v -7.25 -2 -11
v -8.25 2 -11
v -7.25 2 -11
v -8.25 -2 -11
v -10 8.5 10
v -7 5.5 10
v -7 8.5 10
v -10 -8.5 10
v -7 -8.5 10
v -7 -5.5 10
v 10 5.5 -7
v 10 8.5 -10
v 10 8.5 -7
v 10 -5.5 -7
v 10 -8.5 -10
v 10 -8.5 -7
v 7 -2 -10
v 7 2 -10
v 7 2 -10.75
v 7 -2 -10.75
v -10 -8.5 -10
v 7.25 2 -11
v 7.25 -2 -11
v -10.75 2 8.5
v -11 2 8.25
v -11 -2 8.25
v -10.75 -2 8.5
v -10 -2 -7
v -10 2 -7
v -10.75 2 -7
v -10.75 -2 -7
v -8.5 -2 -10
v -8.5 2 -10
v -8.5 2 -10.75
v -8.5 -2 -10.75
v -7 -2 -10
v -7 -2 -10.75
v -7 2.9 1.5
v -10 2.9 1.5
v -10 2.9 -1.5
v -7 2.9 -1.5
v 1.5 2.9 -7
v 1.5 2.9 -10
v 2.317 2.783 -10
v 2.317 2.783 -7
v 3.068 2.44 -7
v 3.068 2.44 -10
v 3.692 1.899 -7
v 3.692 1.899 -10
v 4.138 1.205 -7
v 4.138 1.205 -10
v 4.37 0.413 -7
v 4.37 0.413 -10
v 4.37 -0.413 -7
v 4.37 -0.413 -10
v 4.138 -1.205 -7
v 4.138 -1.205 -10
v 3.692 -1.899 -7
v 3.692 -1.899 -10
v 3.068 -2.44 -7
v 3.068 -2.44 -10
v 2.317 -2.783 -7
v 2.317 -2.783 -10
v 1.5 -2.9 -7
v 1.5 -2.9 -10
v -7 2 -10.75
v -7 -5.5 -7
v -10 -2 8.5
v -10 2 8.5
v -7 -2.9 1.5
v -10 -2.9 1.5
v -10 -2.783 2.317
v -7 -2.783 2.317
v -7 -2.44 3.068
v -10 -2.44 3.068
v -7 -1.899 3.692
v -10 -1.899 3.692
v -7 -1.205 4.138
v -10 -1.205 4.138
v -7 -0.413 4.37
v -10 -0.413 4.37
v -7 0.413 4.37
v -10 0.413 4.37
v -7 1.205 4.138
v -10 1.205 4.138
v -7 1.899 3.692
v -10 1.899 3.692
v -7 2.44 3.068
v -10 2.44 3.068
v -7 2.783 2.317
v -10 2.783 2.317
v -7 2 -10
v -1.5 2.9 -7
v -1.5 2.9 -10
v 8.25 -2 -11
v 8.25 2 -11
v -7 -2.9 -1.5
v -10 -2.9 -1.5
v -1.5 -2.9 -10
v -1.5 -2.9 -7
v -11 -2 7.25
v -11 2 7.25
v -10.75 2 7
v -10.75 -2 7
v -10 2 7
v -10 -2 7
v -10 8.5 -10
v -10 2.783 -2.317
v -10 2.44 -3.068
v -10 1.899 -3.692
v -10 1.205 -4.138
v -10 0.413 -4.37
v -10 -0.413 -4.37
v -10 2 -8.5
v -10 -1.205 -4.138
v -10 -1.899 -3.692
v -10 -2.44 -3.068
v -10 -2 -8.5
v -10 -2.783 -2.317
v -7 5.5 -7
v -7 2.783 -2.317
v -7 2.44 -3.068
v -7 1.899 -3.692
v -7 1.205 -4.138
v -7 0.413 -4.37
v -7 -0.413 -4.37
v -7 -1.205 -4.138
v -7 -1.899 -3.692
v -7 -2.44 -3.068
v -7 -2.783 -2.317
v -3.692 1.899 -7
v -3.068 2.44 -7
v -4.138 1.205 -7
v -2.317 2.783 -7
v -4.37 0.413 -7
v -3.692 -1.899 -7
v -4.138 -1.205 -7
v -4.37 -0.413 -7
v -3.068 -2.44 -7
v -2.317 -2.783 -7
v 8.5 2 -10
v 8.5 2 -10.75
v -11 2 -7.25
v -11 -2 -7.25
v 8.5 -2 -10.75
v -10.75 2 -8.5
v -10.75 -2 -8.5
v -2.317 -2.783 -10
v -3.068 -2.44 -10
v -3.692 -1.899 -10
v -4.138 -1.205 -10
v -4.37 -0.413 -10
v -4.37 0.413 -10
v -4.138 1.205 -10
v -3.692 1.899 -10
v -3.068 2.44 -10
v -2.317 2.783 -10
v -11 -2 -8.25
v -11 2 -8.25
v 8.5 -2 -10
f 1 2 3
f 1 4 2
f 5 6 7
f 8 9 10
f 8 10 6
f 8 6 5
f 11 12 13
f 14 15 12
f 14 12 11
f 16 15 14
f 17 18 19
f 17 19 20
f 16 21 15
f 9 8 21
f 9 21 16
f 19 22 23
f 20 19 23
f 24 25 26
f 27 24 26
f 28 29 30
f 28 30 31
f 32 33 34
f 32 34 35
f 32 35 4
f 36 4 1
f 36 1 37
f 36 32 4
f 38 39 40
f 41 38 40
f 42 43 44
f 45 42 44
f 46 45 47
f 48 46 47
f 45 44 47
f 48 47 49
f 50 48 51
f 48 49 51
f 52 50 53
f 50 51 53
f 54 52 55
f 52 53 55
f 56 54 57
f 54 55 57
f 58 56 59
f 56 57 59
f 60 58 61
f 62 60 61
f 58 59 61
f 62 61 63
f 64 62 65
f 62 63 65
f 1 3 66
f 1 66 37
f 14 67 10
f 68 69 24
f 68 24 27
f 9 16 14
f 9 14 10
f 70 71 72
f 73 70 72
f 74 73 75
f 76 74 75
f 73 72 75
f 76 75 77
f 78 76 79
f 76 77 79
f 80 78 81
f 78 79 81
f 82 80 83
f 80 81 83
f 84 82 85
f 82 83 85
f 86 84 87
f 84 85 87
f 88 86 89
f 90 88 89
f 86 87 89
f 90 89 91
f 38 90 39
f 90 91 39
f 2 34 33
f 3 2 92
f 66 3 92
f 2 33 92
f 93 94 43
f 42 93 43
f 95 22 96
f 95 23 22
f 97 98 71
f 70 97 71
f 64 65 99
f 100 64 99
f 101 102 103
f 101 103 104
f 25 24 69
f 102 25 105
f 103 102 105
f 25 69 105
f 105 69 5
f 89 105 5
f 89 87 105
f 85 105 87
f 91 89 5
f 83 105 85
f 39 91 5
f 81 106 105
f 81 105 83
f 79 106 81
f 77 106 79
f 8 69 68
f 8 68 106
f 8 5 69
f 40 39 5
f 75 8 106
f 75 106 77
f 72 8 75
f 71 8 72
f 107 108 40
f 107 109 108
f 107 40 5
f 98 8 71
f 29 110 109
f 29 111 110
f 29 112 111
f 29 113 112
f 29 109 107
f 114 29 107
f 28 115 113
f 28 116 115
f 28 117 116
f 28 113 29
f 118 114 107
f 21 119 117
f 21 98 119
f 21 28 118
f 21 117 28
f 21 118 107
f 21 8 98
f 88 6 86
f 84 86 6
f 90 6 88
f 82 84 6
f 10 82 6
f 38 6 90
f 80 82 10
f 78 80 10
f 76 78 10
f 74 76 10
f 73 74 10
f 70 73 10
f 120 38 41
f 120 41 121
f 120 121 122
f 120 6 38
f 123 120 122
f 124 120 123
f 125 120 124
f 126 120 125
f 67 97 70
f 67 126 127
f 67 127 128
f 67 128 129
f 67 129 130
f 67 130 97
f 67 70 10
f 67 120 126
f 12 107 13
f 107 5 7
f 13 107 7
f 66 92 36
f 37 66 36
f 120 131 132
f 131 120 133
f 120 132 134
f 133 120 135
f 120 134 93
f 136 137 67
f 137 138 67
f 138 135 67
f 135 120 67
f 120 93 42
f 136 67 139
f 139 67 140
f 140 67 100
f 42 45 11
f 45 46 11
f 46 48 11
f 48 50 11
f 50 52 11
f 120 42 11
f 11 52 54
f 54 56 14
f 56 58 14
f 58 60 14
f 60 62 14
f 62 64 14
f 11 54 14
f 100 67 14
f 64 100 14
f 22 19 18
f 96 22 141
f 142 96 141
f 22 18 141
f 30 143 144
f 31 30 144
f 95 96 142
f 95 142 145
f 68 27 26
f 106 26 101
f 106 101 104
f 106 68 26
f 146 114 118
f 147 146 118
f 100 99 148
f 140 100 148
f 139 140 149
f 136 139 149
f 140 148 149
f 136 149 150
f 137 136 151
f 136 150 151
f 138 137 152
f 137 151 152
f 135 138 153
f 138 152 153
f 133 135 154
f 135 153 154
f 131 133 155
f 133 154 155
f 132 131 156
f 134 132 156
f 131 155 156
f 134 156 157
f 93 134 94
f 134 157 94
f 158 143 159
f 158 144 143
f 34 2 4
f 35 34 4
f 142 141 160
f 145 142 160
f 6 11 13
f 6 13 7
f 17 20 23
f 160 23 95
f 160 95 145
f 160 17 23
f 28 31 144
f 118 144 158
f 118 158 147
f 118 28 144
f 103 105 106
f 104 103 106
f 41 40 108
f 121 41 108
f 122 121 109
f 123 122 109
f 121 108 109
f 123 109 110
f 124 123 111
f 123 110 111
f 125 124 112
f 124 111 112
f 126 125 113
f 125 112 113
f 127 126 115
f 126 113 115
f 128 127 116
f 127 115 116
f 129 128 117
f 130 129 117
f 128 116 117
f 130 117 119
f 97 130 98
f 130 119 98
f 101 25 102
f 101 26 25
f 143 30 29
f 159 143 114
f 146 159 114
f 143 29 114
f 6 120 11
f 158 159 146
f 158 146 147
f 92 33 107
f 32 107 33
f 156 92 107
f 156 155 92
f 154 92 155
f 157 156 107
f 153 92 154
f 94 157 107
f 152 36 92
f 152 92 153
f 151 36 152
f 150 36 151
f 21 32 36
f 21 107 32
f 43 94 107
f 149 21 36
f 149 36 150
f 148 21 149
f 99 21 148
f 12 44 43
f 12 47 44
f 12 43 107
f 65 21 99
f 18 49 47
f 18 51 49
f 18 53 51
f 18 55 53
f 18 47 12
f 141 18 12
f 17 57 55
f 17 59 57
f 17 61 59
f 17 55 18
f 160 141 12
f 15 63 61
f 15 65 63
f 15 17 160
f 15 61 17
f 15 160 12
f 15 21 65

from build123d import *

# Parameters (mm, degrees)
PAD_DEPTH          = 8.5
POCKET_DEPTH       = 3
POCKET001_DEPTH    = 3
SKETCH003_W        = 17
SKETCH003_H        = 11
POCKET002_DEPTH    = 17.001
SKETCH004_W        = 1.5
SKETCH004_H        = 4
PAD001_DEPTH       = 1
POLARPATTERN_COUNT = 2
POLARPATTERN_ANGLE = 90
CHAMFER_SIZE       = 0.25


with BuildPart() as part:
    # Sketch → Pad (new body, symmetric)
    with BuildSketch(Plane.XZ):
        Polygon((-10, 10), (-10, -10), (10, -10), (10, -7), (-7, 10), align=None)
    extrude(amount=PAD_DEPTH, both=True)

    # Sketch001 (on Face1 of Pad) → Pocket (cut)
    with BuildSketch(Plane(origin=(-10, 0, 0), x_dir=(0, 0, -1), z_dir=(-1, 0, 0))):
        with BuildLine():
            ThreePointArc((-1.5, 2.9), (-4.4, 0), (-1.5, -2.9))
            Line((-1.5, -2.9), (1.5, -2.9))
            ThreePointArc((1.5, -2.9), (4.4, 0), (1.5, 2.9))
            Line((1.5, 2.9), (-1.5, 2.9))
        make_face()
    extrude(amount=-POCKET_DEPTH, mode=Mode.SUBTRACT)

    # Sketch002 (on Face5 of Pocket) → Pocket001 (cut)
    with BuildSketch(Plane(origin=(0, 0, -10), x_dir=(1, 0, 0), z_dir=(0, 0, -1))):
        with BuildLine():
            ThreePointArc((-1.5, 2.9), (-4.4, 0), (-1.5, -2.9))
            Line((-1.5, -2.9), (1.5, -2.9))
            ThreePointArc((1.5, -2.9), (4.4, 0), (1.5, 2.9))
            Line((1.5, 2.9), (-1.5, 2.9))
        make_face()
    extrude(amount=-POCKET001_DEPTH, mode=Mode.SUBTRACT)

    # Sketch003 (on Face17 of Pocket001) → Pocket002 (cut, through all)
    with BuildSketch(Plane(origin=(0, 0, -7), x_dir=(1, 0, 0), z_dir=(0, 0, -1))):
        with Locations((1.5, 0)):
            Rectangle(SKETCH003_W, SKETCH003_H)
    extrude(amount=-POCKET002_DEPTH, mode=Mode.SUBTRACT)

    # Sketch004 (on Face1 of Pocket002) → Pad001 (join)
    with BuildSketch(Plane(origin=(-10, 0, 0), x_dir=(0, 0, -1), z_dir=(-1, 0, 0))):
        with Locations((-7.75, 0)):
            Rectangle(SKETCH004_W, SKETCH004_H)
        with Locations((7.75, 0)):
            Rectangle(SKETCH004_W, SKETCH004_H)
    pad001 = extrude(amount=PAD001_DEPTH)

    # PolarPattern: Pad001 ×2 about axis
    polarpattern_axis = Axis((0, 0, 0), (0, -1, 0))
    for i in range(1, POLARPATTERN_COUNT):
        add(pad001.rotate(polarpattern_axis, i * POLARPATTERN_ANGLE / (POLARPATTERN_COUNT - 1)))

    # Chamfer
    chamfer_edges = [part.edges().sort_by_distance(p)[0] for p in [
        (-11, 0, 8.5),
        (-11, 0, 7),
        (-11, 0, -7),
        (-11, 0, -8.5),
        (-8.5, 0, -11),
        (-7, 0, -11),
        (7, 0, -11),
        (8.5, 0, -11),
    ]]
    chamfer(chamfer_edges, length=CHAMFER_SIZE)


solid = part.part
